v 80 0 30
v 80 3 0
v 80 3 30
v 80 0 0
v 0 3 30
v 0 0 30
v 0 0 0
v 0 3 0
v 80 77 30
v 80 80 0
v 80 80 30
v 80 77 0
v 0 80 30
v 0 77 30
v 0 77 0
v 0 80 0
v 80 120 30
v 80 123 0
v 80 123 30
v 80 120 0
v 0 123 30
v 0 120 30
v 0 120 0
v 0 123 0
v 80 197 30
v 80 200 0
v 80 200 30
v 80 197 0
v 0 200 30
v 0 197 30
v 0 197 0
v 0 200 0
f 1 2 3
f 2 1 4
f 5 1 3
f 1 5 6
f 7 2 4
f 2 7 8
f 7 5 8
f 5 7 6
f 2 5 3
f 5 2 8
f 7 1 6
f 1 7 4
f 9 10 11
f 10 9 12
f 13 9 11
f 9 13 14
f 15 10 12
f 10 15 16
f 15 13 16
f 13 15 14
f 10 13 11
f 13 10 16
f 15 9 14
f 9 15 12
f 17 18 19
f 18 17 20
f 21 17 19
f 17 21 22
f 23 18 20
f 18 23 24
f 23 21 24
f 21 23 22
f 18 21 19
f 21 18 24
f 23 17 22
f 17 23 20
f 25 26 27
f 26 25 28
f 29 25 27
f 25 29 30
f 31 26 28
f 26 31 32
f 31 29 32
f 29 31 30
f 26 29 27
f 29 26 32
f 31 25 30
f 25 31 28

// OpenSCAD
use <BOSL/transforms.scad>;
use <BOSL/shapes.scad>;size = 80; // size of the stand
thickness = 3; // thickness of the stand
height = 30; // height of the stand

// function to draw one stand
module stand() {
    // base
    cube([size, thickness, height]);
    // side
    translate([0, size-thickness, 0]) cube([size, thickness, height]);
}

// Draw two identical stands
translate([0, 0, 0]) stand();
translate([0, size*1.5, 0]) stand();
